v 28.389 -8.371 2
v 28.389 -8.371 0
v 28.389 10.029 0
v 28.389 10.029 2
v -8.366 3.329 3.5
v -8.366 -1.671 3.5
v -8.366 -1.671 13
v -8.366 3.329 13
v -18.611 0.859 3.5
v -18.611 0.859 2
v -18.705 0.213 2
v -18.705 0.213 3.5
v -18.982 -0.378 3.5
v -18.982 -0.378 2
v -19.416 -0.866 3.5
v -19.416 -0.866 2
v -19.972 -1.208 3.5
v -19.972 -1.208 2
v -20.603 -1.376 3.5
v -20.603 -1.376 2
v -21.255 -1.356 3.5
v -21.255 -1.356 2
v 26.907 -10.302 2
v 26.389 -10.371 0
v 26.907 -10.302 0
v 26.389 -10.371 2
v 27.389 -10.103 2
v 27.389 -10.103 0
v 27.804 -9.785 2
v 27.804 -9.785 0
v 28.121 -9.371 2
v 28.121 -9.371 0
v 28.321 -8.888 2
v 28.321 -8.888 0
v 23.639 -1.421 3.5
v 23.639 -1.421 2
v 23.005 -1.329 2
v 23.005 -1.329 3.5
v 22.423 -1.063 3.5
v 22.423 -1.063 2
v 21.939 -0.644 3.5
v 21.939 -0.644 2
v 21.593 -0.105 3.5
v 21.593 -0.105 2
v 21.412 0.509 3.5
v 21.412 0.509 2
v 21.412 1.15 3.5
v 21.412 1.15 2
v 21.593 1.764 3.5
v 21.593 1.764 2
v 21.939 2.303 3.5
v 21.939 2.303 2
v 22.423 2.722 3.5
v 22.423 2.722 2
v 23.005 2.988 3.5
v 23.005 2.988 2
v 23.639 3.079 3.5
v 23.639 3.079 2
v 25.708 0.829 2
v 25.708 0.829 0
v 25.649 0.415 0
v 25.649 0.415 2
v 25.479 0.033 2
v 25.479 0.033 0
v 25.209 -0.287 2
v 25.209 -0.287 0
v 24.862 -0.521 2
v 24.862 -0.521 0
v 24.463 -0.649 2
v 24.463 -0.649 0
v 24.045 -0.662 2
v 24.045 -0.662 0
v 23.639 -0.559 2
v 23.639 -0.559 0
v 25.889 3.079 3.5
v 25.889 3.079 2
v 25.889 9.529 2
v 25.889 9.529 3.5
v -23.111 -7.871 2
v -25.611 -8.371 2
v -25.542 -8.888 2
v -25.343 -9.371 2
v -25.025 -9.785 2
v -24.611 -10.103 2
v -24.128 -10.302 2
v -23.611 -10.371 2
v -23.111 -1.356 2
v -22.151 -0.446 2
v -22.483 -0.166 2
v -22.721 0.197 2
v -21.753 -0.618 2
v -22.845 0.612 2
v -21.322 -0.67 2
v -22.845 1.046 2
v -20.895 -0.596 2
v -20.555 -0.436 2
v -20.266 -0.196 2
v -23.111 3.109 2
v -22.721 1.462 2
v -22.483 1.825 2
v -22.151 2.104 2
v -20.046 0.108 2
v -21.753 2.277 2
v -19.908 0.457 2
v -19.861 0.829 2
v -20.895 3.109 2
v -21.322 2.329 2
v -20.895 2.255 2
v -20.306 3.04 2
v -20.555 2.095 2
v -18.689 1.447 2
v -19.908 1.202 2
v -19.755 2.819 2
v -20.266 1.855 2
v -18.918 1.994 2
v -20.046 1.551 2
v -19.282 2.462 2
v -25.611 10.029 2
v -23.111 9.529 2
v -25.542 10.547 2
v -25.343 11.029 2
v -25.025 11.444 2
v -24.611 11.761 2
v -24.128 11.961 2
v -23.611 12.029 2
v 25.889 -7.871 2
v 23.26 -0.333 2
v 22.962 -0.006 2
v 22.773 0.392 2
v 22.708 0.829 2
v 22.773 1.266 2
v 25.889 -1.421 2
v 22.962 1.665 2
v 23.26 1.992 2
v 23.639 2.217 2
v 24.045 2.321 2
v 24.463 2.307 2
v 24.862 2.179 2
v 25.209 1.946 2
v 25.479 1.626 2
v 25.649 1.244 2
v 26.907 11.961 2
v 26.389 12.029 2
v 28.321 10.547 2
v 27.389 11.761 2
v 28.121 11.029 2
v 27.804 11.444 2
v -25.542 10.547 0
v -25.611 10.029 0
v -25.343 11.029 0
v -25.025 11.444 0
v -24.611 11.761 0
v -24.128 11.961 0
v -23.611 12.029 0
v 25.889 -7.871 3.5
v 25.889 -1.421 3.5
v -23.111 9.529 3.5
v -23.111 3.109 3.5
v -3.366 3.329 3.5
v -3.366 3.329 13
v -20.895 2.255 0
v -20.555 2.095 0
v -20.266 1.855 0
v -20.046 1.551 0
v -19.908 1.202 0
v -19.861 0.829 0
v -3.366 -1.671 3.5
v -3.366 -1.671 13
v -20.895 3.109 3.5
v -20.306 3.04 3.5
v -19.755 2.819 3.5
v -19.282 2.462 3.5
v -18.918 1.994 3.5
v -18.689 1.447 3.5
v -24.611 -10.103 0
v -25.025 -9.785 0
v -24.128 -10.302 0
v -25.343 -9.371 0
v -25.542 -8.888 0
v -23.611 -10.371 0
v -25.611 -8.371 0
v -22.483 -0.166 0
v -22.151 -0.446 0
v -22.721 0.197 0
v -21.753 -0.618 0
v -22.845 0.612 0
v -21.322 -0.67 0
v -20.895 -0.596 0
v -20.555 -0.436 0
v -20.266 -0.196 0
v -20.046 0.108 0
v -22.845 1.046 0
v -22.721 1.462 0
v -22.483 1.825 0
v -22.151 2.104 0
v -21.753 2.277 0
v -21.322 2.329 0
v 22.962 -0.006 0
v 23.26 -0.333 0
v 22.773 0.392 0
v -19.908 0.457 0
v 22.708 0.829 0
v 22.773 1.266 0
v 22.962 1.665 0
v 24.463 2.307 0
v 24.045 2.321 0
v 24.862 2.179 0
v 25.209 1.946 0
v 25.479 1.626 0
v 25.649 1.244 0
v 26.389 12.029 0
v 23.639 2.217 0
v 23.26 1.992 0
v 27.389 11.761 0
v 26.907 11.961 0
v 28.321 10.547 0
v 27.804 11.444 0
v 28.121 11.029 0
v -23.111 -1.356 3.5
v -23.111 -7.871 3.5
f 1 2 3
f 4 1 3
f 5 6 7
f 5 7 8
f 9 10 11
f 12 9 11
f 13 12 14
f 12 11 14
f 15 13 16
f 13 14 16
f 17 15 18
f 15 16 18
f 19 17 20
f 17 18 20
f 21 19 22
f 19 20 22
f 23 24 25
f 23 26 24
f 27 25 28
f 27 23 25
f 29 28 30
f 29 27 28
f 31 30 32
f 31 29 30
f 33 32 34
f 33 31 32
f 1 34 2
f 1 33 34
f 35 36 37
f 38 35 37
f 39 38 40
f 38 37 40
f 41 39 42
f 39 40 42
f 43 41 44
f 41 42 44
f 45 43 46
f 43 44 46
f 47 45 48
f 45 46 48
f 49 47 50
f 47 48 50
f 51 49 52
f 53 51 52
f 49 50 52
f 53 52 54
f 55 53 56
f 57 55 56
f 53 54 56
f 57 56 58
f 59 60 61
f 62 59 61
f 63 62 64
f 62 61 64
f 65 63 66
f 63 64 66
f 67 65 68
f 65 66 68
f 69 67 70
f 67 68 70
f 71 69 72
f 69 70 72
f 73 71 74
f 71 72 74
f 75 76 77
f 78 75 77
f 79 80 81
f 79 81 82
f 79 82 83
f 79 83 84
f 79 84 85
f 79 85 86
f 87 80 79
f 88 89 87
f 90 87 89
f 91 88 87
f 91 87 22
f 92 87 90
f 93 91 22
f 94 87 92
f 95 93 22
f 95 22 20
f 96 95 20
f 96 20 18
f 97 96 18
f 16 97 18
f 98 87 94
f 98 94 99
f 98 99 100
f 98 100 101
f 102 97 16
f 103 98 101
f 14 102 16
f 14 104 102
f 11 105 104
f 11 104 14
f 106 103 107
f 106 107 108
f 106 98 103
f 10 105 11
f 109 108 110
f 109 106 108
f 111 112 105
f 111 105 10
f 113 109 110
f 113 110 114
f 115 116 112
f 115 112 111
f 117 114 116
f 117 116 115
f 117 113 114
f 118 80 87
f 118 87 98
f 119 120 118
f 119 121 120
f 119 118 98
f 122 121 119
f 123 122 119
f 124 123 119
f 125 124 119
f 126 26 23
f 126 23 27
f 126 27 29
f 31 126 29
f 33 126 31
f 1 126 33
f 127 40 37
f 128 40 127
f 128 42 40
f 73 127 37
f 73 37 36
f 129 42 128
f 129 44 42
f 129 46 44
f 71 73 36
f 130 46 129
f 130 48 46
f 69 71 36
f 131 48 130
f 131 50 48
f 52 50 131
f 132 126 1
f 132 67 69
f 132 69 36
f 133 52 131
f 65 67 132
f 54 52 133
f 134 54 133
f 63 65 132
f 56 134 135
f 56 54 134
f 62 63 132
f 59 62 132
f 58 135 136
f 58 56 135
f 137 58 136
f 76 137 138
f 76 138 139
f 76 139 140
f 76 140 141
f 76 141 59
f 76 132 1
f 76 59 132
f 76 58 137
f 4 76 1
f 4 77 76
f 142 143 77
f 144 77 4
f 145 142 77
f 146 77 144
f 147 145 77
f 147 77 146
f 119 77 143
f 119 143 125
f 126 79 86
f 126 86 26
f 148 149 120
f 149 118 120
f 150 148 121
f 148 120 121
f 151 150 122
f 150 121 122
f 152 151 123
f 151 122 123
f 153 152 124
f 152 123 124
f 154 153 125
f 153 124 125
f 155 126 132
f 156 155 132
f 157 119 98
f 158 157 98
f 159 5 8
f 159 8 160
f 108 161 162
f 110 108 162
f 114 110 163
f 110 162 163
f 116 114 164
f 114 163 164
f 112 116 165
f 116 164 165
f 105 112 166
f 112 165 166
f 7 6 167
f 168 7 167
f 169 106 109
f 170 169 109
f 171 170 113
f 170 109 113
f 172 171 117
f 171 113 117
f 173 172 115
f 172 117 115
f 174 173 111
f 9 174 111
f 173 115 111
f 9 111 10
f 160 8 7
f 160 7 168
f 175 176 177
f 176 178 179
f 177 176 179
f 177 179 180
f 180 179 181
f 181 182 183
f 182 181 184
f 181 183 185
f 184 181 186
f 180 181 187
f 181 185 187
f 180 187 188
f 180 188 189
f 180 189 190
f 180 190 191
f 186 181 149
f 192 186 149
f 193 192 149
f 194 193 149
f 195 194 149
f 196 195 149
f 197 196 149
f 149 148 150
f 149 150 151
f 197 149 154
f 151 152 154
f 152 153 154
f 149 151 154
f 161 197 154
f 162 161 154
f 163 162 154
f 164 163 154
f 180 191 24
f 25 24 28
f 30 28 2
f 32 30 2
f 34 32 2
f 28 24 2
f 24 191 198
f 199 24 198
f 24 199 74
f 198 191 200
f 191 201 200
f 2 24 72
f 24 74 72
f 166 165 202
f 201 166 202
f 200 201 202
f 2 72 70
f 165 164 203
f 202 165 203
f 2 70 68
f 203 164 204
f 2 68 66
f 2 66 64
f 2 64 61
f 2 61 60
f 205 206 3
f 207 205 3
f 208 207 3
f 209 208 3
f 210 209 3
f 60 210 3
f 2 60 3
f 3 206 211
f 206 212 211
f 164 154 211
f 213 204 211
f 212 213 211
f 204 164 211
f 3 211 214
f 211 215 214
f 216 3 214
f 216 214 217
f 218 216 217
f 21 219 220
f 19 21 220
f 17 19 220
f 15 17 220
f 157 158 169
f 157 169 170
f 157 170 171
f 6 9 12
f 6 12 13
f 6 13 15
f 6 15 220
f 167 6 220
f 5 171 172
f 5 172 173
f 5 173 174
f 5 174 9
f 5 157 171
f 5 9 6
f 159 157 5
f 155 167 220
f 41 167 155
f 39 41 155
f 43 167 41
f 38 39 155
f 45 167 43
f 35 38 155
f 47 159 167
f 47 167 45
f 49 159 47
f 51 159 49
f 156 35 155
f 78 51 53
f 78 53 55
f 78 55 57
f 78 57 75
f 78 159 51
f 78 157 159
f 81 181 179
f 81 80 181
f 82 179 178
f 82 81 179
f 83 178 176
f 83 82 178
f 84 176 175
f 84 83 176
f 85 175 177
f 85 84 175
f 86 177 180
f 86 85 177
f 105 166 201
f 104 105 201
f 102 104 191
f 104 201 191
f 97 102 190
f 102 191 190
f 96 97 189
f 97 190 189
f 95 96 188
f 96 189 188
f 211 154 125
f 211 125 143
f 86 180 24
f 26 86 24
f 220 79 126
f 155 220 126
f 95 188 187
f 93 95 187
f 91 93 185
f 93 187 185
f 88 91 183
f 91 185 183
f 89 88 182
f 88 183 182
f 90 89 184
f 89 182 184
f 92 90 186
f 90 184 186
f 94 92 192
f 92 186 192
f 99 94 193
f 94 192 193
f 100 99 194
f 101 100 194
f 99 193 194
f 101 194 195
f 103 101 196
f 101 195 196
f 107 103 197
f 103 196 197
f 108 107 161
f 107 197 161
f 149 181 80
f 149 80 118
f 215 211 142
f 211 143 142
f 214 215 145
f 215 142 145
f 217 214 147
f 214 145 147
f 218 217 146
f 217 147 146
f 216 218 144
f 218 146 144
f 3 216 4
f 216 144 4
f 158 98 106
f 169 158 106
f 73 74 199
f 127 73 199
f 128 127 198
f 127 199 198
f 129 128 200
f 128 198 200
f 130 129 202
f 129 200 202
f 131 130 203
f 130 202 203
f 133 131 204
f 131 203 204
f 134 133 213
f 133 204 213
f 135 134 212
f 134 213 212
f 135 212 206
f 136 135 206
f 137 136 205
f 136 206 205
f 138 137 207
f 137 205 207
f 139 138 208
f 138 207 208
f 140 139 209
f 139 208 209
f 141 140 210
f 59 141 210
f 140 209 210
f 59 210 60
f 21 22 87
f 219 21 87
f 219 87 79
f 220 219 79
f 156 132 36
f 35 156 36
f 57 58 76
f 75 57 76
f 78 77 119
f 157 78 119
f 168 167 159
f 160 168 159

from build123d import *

# Parameters (mm, degrees)
F0_W     = 54
F0_H     = 22.4
F0_W_2   = 5
F0_H_2   = 5
F1_DEPTH = 2
F2_DEPTH = 13
F3_DEPTH = 3.5
F4_R     = 2


# Not quite as in the source:
# - a feature names something its author has since deleted; it is built from what else it names


with BuildPart() as f1:
    # F0 (on Top) → F1 (new body)
    with BuildSketch(Plane.XY):
        with Locations((1.3893617413, 0.829365923)):
            Rectangle(F0_W, F0_H)
        Polygon((-23.1106382587, 3.1091097071), (-23.1106382587, 9.529365923), (25.8893617413, 9.529365923), (25.8893617413, 3.079365923), (25.8893617413, 0.829365923), (25.8893617413, -1.420634077), (25.8893617413, -7.870634077), (-23.1106382587, -7.870634077), (-23.1106382587, -1.3557597995), (-23.1106382587, 0.859365923), align=None, mode=Mode.SUBTRACT)
        with BuildLine():
            Line((25.8893617413, 9.529365923), (-23.1106382587, 9.529365923))
            Line((-23.1106382587, 9.529365923), (-23.1106382587, 3.1091097071))
            Line((-23.1106382587, 3.1091097071), (-20.8945927259, 3.1091097071))
            ThreePointArc((-20.8945927259, 3.1091097071), (-19.2816983534, 2.4623159458), (-18.6106382587, 0.859365923))
            ThreePointArc((-18.6106382587, 0.859365923), (-19.4158848712, -0.8655073041), (-21.2552495026, -1.3557597995))
            Line((-21.2552495026, -1.3557597995), (-23.1106382587, -1.3557597995))
            Line((-23.1106382587, -1.3557597995), (-23.1106382587, -7.870634077))
            Line((-23.1106382587, -7.870634077), (25.8893617413, -7.870634077))
            Line((25.8893617413, -7.870634077), (25.8893617413, -1.420634077))
            Line((25.8893617413, -1.420634077), (23.6393617413, -1.420634077))
            ThreePointArc((23.6393617413, -1.420634077), (21.3893617413, 0.829365923), (23.6393617413, 3.079365923))
            Line((23.6393617413, 3.079365923), (25.8893617413, 3.079365923))
            Line((25.8893617413, 3.079365923), (25.8893617413, 9.529365923))
        make_face()
        with Locations((-5.8658428788, 0.829365923)):
            Rectangle(F0_W_2, F0_H_2, mode=Mode.SUBTRACT)
        with BuildLine():
            Line((-20.8945927259, 3.1091097071), (-23.1106382587, 3.1091097071))
            Line((-23.1106382587, 3.1091097071), (-23.1106382587, 0.859365923))
            ThreePointArc((-23.1106382587, 0.859365923), (-22.4635882815, 2.4383058282), (-20.8945927259, 3.1091097071))
        make_face()
        with BuildLine():
            Line((25.8893617413, 0.829365923), (25.8893617413, 3.079365923))
            Line((25.8893617413, 3.079365923), (23.6393617413, 3.079365923))
            ThreePointArc((23.6393617413, 3.079365923), (25.230351999, 2.4203561806), (25.8893617413, 0.829365923))
        make_face()
        with BuildLine():
            ThreePointArc((-21.2552495026, -1.3557597995), (-22.5855114857, -0.5853874645), (-23.1106382587, 0.859365923))
            Line((-23.1106382587, 0.859365923), (-23.1106382587, -1.3557597995))
            Line((-23.1106382587, -1.3557597995), (-21.2552495026, -1.3557597995))
        make_face()
        with BuildLine():
            ThreePointArc((-20.8945927259, 3.1091097071), (-22.4635882815, 2.4383058282), (-23.1106382587, 0.859365923))
            ThreePointArc((-23.1106382587, 0.859365923), (-22.5855114857, -0.5853874645), (-21.2552495026, -1.3557597995))
            Line((-21.2552495026, -1.3557597995), (-20.8945927259, -1.3557597995))
            Line((-20.8945927259, -1.3557597995), (-20.8945927259, -0.5963975782))
            ThreePointArc((-20.8945927259, -0.5963975782), (-22.8606382587, 0.829365923), (-20.8945927259, 2.2551294242))
            Line((-20.8945927259, 2.2551294242), (-20.8945927259, 3.1091097071))
        make_face()
        with BuildLine():
            ThreePointArc((-18.6106382587, 0.859365923), (-19.2816983534, 2.4623159458), (-20.8945927259, 3.1091097071))
            Line((-20.8945927259, 3.1091097071), (-20.8945927259, 2.2551294242))
            ThreePointArc((-20.8945927259, 2.2551294242), (-20.1463342813, 1.7099713115), (-19.8606382587, 0.829365923))
            ThreePointArc((-19.8606382587, 0.829365923), (-20.1463342813, -0.0512394656), (-20.8945927259, -0.5963975782))
            Line((-20.8945927259, -0.5963975782), (-20.8945927259, -1.3557597995))
            Line((-20.8945927259, -1.3557597995), (-21.2552495026, -1.3557597995))
            ThreePointArc((-21.2552495026, -1.3557597995), (-19.4158848712, -0.8655073041), (-18.6106382587, 0.859365923))
        make_face()
        with BuildLine():
            ThreePointArc((23.6393617413, -1.420634077), (25.230351999, -0.7616243347), (25.8893617413, 0.829365923))
            ThreePointArc((25.8893617413, 0.829365923), (25.230351999, 2.4203561806), (23.6393617413, 3.079365923))
            Line((23.6393617413, 3.079365923), (23.6393617413, 2.2174858052))
            ThreePointArc((23.6393617413, 2.2174858052), (25.043666155, 2.0748896863), (25.7078010014, 0.829365923))
            ThreePointArc((25.7078010014, 0.829365923), (25.043666155, -0.4161578404), (23.6393617413, -0.5587539593))
            Line((23.6393617413, -0.5587539593), (23.6393617413, -1.420634077))
        make_face()
        with BuildLine():
            Line((25.8893617413, -1.420634077), (25.8893617413, 0.829365923))
            ThreePointArc((25.8893617413, 0.829365923), (25.230351999, -0.7616243347), (23.6393617413, -1.420634077))
            Line((23.6393617413, -1.420634077), (25.8893617413, -1.420634077))
        make_face()
        with BuildLine():
            Line((23.6393617413, 2.2174858052), (23.6393617413, 3.079365923))
            ThreePointArc((23.6393617413, 3.079365923), (21.3893617413, 0.829365923), (23.6393617413, -1.420634077))
            Line((23.6393617413, -1.420634077), (23.6393617413, -0.5587539593))
            ThreePointArc((23.6393617413, -0.5587539593), (22.7078010014, 0.829365923), (23.6393617413, 2.2174858052))
        make_face()
        with Locations((-5.8658428788, 0.829365923)):
            Rectangle(F0_W_2, F0_H_2)
    extrude(amount=F1_DEPTH)

    # F0 (on Top) → F2 (join)
    with BuildSketch(Plane.XY):
        with Locations((-5.8658428788, 0.829365923)):
            Rectangle(F0_W_2, F0_H_2)
    extrude(amount=F2_DEPTH)

    # F0 (on Top) → F3 (join)
    with BuildSketch(Plane.XY):
        with BuildLine():
            Line((25.8893617413, 9.529365923), (-23.1106382587, 9.529365923))
            Line((-23.1106382587, 9.529365923), (-23.1106382587, 3.1091097071))
            Line((-23.1106382587, 3.1091097071), (-20.8945927259, 3.1091097071))
            ThreePointArc((-20.8945927259, 3.1091097071), (-19.2816983534, 2.4623159458), (-18.6106382587, 0.859365923))
            ThreePointArc((-18.6106382587, 0.859365923), (-19.4158848712, -0.8655073041), (-21.2552495026, -1.3557597995))
            Line((-21.2552495026, -1.3557597995), (-23.1106382587, -1.3557597995))
            Line((-23.1106382587, -1.3557597995), (-23.1106382587, -7.870634077))
            Line((-23.1106382587, -7.870634077), (25.8893617413, -7.870634077))
            Line((25.8893617413, -7.870634077), (25.8893617413, -1.420634077))
            Line((25.8893617413, -1.420634077), (23.6393617413, -1.420634077))
            ThreePointArc((23.6393617413, -1.420634077), (21.3893617413, 0.829365923), (23.6393617413, 3.079365923))
            Line((23.6393617413, 3.079365923), (25.8893617413, 3.079365923))
            Line((25.8893617413, 3.079365923), (25.8893617413, 9.529365923))
        make_face()
        with Locations((-5.8658428788, 0.829365923)):
            Rectangle(F0_W_2, F0_H_2, mode=Mode.SUBTRACT)
        with Locations((-5.8658428788, 0.829365923)):
            Rectangle(F0_W_2, F0_H_2)
    extrude(amount=F3_DEPTH)

    # F4
    f4_edges = [f1.edges().sort_by_distance(p)[0] for p in [
        (-25.610638, 12.029366, 1),
        (-25.610638, -10.370634, 1),
        (28.389362, 12.029366, 1),
        (28.389362, -10.370634, 1),
    ]]
    fillet(f4_edges, radius=F4_R)


solid = f1.part
